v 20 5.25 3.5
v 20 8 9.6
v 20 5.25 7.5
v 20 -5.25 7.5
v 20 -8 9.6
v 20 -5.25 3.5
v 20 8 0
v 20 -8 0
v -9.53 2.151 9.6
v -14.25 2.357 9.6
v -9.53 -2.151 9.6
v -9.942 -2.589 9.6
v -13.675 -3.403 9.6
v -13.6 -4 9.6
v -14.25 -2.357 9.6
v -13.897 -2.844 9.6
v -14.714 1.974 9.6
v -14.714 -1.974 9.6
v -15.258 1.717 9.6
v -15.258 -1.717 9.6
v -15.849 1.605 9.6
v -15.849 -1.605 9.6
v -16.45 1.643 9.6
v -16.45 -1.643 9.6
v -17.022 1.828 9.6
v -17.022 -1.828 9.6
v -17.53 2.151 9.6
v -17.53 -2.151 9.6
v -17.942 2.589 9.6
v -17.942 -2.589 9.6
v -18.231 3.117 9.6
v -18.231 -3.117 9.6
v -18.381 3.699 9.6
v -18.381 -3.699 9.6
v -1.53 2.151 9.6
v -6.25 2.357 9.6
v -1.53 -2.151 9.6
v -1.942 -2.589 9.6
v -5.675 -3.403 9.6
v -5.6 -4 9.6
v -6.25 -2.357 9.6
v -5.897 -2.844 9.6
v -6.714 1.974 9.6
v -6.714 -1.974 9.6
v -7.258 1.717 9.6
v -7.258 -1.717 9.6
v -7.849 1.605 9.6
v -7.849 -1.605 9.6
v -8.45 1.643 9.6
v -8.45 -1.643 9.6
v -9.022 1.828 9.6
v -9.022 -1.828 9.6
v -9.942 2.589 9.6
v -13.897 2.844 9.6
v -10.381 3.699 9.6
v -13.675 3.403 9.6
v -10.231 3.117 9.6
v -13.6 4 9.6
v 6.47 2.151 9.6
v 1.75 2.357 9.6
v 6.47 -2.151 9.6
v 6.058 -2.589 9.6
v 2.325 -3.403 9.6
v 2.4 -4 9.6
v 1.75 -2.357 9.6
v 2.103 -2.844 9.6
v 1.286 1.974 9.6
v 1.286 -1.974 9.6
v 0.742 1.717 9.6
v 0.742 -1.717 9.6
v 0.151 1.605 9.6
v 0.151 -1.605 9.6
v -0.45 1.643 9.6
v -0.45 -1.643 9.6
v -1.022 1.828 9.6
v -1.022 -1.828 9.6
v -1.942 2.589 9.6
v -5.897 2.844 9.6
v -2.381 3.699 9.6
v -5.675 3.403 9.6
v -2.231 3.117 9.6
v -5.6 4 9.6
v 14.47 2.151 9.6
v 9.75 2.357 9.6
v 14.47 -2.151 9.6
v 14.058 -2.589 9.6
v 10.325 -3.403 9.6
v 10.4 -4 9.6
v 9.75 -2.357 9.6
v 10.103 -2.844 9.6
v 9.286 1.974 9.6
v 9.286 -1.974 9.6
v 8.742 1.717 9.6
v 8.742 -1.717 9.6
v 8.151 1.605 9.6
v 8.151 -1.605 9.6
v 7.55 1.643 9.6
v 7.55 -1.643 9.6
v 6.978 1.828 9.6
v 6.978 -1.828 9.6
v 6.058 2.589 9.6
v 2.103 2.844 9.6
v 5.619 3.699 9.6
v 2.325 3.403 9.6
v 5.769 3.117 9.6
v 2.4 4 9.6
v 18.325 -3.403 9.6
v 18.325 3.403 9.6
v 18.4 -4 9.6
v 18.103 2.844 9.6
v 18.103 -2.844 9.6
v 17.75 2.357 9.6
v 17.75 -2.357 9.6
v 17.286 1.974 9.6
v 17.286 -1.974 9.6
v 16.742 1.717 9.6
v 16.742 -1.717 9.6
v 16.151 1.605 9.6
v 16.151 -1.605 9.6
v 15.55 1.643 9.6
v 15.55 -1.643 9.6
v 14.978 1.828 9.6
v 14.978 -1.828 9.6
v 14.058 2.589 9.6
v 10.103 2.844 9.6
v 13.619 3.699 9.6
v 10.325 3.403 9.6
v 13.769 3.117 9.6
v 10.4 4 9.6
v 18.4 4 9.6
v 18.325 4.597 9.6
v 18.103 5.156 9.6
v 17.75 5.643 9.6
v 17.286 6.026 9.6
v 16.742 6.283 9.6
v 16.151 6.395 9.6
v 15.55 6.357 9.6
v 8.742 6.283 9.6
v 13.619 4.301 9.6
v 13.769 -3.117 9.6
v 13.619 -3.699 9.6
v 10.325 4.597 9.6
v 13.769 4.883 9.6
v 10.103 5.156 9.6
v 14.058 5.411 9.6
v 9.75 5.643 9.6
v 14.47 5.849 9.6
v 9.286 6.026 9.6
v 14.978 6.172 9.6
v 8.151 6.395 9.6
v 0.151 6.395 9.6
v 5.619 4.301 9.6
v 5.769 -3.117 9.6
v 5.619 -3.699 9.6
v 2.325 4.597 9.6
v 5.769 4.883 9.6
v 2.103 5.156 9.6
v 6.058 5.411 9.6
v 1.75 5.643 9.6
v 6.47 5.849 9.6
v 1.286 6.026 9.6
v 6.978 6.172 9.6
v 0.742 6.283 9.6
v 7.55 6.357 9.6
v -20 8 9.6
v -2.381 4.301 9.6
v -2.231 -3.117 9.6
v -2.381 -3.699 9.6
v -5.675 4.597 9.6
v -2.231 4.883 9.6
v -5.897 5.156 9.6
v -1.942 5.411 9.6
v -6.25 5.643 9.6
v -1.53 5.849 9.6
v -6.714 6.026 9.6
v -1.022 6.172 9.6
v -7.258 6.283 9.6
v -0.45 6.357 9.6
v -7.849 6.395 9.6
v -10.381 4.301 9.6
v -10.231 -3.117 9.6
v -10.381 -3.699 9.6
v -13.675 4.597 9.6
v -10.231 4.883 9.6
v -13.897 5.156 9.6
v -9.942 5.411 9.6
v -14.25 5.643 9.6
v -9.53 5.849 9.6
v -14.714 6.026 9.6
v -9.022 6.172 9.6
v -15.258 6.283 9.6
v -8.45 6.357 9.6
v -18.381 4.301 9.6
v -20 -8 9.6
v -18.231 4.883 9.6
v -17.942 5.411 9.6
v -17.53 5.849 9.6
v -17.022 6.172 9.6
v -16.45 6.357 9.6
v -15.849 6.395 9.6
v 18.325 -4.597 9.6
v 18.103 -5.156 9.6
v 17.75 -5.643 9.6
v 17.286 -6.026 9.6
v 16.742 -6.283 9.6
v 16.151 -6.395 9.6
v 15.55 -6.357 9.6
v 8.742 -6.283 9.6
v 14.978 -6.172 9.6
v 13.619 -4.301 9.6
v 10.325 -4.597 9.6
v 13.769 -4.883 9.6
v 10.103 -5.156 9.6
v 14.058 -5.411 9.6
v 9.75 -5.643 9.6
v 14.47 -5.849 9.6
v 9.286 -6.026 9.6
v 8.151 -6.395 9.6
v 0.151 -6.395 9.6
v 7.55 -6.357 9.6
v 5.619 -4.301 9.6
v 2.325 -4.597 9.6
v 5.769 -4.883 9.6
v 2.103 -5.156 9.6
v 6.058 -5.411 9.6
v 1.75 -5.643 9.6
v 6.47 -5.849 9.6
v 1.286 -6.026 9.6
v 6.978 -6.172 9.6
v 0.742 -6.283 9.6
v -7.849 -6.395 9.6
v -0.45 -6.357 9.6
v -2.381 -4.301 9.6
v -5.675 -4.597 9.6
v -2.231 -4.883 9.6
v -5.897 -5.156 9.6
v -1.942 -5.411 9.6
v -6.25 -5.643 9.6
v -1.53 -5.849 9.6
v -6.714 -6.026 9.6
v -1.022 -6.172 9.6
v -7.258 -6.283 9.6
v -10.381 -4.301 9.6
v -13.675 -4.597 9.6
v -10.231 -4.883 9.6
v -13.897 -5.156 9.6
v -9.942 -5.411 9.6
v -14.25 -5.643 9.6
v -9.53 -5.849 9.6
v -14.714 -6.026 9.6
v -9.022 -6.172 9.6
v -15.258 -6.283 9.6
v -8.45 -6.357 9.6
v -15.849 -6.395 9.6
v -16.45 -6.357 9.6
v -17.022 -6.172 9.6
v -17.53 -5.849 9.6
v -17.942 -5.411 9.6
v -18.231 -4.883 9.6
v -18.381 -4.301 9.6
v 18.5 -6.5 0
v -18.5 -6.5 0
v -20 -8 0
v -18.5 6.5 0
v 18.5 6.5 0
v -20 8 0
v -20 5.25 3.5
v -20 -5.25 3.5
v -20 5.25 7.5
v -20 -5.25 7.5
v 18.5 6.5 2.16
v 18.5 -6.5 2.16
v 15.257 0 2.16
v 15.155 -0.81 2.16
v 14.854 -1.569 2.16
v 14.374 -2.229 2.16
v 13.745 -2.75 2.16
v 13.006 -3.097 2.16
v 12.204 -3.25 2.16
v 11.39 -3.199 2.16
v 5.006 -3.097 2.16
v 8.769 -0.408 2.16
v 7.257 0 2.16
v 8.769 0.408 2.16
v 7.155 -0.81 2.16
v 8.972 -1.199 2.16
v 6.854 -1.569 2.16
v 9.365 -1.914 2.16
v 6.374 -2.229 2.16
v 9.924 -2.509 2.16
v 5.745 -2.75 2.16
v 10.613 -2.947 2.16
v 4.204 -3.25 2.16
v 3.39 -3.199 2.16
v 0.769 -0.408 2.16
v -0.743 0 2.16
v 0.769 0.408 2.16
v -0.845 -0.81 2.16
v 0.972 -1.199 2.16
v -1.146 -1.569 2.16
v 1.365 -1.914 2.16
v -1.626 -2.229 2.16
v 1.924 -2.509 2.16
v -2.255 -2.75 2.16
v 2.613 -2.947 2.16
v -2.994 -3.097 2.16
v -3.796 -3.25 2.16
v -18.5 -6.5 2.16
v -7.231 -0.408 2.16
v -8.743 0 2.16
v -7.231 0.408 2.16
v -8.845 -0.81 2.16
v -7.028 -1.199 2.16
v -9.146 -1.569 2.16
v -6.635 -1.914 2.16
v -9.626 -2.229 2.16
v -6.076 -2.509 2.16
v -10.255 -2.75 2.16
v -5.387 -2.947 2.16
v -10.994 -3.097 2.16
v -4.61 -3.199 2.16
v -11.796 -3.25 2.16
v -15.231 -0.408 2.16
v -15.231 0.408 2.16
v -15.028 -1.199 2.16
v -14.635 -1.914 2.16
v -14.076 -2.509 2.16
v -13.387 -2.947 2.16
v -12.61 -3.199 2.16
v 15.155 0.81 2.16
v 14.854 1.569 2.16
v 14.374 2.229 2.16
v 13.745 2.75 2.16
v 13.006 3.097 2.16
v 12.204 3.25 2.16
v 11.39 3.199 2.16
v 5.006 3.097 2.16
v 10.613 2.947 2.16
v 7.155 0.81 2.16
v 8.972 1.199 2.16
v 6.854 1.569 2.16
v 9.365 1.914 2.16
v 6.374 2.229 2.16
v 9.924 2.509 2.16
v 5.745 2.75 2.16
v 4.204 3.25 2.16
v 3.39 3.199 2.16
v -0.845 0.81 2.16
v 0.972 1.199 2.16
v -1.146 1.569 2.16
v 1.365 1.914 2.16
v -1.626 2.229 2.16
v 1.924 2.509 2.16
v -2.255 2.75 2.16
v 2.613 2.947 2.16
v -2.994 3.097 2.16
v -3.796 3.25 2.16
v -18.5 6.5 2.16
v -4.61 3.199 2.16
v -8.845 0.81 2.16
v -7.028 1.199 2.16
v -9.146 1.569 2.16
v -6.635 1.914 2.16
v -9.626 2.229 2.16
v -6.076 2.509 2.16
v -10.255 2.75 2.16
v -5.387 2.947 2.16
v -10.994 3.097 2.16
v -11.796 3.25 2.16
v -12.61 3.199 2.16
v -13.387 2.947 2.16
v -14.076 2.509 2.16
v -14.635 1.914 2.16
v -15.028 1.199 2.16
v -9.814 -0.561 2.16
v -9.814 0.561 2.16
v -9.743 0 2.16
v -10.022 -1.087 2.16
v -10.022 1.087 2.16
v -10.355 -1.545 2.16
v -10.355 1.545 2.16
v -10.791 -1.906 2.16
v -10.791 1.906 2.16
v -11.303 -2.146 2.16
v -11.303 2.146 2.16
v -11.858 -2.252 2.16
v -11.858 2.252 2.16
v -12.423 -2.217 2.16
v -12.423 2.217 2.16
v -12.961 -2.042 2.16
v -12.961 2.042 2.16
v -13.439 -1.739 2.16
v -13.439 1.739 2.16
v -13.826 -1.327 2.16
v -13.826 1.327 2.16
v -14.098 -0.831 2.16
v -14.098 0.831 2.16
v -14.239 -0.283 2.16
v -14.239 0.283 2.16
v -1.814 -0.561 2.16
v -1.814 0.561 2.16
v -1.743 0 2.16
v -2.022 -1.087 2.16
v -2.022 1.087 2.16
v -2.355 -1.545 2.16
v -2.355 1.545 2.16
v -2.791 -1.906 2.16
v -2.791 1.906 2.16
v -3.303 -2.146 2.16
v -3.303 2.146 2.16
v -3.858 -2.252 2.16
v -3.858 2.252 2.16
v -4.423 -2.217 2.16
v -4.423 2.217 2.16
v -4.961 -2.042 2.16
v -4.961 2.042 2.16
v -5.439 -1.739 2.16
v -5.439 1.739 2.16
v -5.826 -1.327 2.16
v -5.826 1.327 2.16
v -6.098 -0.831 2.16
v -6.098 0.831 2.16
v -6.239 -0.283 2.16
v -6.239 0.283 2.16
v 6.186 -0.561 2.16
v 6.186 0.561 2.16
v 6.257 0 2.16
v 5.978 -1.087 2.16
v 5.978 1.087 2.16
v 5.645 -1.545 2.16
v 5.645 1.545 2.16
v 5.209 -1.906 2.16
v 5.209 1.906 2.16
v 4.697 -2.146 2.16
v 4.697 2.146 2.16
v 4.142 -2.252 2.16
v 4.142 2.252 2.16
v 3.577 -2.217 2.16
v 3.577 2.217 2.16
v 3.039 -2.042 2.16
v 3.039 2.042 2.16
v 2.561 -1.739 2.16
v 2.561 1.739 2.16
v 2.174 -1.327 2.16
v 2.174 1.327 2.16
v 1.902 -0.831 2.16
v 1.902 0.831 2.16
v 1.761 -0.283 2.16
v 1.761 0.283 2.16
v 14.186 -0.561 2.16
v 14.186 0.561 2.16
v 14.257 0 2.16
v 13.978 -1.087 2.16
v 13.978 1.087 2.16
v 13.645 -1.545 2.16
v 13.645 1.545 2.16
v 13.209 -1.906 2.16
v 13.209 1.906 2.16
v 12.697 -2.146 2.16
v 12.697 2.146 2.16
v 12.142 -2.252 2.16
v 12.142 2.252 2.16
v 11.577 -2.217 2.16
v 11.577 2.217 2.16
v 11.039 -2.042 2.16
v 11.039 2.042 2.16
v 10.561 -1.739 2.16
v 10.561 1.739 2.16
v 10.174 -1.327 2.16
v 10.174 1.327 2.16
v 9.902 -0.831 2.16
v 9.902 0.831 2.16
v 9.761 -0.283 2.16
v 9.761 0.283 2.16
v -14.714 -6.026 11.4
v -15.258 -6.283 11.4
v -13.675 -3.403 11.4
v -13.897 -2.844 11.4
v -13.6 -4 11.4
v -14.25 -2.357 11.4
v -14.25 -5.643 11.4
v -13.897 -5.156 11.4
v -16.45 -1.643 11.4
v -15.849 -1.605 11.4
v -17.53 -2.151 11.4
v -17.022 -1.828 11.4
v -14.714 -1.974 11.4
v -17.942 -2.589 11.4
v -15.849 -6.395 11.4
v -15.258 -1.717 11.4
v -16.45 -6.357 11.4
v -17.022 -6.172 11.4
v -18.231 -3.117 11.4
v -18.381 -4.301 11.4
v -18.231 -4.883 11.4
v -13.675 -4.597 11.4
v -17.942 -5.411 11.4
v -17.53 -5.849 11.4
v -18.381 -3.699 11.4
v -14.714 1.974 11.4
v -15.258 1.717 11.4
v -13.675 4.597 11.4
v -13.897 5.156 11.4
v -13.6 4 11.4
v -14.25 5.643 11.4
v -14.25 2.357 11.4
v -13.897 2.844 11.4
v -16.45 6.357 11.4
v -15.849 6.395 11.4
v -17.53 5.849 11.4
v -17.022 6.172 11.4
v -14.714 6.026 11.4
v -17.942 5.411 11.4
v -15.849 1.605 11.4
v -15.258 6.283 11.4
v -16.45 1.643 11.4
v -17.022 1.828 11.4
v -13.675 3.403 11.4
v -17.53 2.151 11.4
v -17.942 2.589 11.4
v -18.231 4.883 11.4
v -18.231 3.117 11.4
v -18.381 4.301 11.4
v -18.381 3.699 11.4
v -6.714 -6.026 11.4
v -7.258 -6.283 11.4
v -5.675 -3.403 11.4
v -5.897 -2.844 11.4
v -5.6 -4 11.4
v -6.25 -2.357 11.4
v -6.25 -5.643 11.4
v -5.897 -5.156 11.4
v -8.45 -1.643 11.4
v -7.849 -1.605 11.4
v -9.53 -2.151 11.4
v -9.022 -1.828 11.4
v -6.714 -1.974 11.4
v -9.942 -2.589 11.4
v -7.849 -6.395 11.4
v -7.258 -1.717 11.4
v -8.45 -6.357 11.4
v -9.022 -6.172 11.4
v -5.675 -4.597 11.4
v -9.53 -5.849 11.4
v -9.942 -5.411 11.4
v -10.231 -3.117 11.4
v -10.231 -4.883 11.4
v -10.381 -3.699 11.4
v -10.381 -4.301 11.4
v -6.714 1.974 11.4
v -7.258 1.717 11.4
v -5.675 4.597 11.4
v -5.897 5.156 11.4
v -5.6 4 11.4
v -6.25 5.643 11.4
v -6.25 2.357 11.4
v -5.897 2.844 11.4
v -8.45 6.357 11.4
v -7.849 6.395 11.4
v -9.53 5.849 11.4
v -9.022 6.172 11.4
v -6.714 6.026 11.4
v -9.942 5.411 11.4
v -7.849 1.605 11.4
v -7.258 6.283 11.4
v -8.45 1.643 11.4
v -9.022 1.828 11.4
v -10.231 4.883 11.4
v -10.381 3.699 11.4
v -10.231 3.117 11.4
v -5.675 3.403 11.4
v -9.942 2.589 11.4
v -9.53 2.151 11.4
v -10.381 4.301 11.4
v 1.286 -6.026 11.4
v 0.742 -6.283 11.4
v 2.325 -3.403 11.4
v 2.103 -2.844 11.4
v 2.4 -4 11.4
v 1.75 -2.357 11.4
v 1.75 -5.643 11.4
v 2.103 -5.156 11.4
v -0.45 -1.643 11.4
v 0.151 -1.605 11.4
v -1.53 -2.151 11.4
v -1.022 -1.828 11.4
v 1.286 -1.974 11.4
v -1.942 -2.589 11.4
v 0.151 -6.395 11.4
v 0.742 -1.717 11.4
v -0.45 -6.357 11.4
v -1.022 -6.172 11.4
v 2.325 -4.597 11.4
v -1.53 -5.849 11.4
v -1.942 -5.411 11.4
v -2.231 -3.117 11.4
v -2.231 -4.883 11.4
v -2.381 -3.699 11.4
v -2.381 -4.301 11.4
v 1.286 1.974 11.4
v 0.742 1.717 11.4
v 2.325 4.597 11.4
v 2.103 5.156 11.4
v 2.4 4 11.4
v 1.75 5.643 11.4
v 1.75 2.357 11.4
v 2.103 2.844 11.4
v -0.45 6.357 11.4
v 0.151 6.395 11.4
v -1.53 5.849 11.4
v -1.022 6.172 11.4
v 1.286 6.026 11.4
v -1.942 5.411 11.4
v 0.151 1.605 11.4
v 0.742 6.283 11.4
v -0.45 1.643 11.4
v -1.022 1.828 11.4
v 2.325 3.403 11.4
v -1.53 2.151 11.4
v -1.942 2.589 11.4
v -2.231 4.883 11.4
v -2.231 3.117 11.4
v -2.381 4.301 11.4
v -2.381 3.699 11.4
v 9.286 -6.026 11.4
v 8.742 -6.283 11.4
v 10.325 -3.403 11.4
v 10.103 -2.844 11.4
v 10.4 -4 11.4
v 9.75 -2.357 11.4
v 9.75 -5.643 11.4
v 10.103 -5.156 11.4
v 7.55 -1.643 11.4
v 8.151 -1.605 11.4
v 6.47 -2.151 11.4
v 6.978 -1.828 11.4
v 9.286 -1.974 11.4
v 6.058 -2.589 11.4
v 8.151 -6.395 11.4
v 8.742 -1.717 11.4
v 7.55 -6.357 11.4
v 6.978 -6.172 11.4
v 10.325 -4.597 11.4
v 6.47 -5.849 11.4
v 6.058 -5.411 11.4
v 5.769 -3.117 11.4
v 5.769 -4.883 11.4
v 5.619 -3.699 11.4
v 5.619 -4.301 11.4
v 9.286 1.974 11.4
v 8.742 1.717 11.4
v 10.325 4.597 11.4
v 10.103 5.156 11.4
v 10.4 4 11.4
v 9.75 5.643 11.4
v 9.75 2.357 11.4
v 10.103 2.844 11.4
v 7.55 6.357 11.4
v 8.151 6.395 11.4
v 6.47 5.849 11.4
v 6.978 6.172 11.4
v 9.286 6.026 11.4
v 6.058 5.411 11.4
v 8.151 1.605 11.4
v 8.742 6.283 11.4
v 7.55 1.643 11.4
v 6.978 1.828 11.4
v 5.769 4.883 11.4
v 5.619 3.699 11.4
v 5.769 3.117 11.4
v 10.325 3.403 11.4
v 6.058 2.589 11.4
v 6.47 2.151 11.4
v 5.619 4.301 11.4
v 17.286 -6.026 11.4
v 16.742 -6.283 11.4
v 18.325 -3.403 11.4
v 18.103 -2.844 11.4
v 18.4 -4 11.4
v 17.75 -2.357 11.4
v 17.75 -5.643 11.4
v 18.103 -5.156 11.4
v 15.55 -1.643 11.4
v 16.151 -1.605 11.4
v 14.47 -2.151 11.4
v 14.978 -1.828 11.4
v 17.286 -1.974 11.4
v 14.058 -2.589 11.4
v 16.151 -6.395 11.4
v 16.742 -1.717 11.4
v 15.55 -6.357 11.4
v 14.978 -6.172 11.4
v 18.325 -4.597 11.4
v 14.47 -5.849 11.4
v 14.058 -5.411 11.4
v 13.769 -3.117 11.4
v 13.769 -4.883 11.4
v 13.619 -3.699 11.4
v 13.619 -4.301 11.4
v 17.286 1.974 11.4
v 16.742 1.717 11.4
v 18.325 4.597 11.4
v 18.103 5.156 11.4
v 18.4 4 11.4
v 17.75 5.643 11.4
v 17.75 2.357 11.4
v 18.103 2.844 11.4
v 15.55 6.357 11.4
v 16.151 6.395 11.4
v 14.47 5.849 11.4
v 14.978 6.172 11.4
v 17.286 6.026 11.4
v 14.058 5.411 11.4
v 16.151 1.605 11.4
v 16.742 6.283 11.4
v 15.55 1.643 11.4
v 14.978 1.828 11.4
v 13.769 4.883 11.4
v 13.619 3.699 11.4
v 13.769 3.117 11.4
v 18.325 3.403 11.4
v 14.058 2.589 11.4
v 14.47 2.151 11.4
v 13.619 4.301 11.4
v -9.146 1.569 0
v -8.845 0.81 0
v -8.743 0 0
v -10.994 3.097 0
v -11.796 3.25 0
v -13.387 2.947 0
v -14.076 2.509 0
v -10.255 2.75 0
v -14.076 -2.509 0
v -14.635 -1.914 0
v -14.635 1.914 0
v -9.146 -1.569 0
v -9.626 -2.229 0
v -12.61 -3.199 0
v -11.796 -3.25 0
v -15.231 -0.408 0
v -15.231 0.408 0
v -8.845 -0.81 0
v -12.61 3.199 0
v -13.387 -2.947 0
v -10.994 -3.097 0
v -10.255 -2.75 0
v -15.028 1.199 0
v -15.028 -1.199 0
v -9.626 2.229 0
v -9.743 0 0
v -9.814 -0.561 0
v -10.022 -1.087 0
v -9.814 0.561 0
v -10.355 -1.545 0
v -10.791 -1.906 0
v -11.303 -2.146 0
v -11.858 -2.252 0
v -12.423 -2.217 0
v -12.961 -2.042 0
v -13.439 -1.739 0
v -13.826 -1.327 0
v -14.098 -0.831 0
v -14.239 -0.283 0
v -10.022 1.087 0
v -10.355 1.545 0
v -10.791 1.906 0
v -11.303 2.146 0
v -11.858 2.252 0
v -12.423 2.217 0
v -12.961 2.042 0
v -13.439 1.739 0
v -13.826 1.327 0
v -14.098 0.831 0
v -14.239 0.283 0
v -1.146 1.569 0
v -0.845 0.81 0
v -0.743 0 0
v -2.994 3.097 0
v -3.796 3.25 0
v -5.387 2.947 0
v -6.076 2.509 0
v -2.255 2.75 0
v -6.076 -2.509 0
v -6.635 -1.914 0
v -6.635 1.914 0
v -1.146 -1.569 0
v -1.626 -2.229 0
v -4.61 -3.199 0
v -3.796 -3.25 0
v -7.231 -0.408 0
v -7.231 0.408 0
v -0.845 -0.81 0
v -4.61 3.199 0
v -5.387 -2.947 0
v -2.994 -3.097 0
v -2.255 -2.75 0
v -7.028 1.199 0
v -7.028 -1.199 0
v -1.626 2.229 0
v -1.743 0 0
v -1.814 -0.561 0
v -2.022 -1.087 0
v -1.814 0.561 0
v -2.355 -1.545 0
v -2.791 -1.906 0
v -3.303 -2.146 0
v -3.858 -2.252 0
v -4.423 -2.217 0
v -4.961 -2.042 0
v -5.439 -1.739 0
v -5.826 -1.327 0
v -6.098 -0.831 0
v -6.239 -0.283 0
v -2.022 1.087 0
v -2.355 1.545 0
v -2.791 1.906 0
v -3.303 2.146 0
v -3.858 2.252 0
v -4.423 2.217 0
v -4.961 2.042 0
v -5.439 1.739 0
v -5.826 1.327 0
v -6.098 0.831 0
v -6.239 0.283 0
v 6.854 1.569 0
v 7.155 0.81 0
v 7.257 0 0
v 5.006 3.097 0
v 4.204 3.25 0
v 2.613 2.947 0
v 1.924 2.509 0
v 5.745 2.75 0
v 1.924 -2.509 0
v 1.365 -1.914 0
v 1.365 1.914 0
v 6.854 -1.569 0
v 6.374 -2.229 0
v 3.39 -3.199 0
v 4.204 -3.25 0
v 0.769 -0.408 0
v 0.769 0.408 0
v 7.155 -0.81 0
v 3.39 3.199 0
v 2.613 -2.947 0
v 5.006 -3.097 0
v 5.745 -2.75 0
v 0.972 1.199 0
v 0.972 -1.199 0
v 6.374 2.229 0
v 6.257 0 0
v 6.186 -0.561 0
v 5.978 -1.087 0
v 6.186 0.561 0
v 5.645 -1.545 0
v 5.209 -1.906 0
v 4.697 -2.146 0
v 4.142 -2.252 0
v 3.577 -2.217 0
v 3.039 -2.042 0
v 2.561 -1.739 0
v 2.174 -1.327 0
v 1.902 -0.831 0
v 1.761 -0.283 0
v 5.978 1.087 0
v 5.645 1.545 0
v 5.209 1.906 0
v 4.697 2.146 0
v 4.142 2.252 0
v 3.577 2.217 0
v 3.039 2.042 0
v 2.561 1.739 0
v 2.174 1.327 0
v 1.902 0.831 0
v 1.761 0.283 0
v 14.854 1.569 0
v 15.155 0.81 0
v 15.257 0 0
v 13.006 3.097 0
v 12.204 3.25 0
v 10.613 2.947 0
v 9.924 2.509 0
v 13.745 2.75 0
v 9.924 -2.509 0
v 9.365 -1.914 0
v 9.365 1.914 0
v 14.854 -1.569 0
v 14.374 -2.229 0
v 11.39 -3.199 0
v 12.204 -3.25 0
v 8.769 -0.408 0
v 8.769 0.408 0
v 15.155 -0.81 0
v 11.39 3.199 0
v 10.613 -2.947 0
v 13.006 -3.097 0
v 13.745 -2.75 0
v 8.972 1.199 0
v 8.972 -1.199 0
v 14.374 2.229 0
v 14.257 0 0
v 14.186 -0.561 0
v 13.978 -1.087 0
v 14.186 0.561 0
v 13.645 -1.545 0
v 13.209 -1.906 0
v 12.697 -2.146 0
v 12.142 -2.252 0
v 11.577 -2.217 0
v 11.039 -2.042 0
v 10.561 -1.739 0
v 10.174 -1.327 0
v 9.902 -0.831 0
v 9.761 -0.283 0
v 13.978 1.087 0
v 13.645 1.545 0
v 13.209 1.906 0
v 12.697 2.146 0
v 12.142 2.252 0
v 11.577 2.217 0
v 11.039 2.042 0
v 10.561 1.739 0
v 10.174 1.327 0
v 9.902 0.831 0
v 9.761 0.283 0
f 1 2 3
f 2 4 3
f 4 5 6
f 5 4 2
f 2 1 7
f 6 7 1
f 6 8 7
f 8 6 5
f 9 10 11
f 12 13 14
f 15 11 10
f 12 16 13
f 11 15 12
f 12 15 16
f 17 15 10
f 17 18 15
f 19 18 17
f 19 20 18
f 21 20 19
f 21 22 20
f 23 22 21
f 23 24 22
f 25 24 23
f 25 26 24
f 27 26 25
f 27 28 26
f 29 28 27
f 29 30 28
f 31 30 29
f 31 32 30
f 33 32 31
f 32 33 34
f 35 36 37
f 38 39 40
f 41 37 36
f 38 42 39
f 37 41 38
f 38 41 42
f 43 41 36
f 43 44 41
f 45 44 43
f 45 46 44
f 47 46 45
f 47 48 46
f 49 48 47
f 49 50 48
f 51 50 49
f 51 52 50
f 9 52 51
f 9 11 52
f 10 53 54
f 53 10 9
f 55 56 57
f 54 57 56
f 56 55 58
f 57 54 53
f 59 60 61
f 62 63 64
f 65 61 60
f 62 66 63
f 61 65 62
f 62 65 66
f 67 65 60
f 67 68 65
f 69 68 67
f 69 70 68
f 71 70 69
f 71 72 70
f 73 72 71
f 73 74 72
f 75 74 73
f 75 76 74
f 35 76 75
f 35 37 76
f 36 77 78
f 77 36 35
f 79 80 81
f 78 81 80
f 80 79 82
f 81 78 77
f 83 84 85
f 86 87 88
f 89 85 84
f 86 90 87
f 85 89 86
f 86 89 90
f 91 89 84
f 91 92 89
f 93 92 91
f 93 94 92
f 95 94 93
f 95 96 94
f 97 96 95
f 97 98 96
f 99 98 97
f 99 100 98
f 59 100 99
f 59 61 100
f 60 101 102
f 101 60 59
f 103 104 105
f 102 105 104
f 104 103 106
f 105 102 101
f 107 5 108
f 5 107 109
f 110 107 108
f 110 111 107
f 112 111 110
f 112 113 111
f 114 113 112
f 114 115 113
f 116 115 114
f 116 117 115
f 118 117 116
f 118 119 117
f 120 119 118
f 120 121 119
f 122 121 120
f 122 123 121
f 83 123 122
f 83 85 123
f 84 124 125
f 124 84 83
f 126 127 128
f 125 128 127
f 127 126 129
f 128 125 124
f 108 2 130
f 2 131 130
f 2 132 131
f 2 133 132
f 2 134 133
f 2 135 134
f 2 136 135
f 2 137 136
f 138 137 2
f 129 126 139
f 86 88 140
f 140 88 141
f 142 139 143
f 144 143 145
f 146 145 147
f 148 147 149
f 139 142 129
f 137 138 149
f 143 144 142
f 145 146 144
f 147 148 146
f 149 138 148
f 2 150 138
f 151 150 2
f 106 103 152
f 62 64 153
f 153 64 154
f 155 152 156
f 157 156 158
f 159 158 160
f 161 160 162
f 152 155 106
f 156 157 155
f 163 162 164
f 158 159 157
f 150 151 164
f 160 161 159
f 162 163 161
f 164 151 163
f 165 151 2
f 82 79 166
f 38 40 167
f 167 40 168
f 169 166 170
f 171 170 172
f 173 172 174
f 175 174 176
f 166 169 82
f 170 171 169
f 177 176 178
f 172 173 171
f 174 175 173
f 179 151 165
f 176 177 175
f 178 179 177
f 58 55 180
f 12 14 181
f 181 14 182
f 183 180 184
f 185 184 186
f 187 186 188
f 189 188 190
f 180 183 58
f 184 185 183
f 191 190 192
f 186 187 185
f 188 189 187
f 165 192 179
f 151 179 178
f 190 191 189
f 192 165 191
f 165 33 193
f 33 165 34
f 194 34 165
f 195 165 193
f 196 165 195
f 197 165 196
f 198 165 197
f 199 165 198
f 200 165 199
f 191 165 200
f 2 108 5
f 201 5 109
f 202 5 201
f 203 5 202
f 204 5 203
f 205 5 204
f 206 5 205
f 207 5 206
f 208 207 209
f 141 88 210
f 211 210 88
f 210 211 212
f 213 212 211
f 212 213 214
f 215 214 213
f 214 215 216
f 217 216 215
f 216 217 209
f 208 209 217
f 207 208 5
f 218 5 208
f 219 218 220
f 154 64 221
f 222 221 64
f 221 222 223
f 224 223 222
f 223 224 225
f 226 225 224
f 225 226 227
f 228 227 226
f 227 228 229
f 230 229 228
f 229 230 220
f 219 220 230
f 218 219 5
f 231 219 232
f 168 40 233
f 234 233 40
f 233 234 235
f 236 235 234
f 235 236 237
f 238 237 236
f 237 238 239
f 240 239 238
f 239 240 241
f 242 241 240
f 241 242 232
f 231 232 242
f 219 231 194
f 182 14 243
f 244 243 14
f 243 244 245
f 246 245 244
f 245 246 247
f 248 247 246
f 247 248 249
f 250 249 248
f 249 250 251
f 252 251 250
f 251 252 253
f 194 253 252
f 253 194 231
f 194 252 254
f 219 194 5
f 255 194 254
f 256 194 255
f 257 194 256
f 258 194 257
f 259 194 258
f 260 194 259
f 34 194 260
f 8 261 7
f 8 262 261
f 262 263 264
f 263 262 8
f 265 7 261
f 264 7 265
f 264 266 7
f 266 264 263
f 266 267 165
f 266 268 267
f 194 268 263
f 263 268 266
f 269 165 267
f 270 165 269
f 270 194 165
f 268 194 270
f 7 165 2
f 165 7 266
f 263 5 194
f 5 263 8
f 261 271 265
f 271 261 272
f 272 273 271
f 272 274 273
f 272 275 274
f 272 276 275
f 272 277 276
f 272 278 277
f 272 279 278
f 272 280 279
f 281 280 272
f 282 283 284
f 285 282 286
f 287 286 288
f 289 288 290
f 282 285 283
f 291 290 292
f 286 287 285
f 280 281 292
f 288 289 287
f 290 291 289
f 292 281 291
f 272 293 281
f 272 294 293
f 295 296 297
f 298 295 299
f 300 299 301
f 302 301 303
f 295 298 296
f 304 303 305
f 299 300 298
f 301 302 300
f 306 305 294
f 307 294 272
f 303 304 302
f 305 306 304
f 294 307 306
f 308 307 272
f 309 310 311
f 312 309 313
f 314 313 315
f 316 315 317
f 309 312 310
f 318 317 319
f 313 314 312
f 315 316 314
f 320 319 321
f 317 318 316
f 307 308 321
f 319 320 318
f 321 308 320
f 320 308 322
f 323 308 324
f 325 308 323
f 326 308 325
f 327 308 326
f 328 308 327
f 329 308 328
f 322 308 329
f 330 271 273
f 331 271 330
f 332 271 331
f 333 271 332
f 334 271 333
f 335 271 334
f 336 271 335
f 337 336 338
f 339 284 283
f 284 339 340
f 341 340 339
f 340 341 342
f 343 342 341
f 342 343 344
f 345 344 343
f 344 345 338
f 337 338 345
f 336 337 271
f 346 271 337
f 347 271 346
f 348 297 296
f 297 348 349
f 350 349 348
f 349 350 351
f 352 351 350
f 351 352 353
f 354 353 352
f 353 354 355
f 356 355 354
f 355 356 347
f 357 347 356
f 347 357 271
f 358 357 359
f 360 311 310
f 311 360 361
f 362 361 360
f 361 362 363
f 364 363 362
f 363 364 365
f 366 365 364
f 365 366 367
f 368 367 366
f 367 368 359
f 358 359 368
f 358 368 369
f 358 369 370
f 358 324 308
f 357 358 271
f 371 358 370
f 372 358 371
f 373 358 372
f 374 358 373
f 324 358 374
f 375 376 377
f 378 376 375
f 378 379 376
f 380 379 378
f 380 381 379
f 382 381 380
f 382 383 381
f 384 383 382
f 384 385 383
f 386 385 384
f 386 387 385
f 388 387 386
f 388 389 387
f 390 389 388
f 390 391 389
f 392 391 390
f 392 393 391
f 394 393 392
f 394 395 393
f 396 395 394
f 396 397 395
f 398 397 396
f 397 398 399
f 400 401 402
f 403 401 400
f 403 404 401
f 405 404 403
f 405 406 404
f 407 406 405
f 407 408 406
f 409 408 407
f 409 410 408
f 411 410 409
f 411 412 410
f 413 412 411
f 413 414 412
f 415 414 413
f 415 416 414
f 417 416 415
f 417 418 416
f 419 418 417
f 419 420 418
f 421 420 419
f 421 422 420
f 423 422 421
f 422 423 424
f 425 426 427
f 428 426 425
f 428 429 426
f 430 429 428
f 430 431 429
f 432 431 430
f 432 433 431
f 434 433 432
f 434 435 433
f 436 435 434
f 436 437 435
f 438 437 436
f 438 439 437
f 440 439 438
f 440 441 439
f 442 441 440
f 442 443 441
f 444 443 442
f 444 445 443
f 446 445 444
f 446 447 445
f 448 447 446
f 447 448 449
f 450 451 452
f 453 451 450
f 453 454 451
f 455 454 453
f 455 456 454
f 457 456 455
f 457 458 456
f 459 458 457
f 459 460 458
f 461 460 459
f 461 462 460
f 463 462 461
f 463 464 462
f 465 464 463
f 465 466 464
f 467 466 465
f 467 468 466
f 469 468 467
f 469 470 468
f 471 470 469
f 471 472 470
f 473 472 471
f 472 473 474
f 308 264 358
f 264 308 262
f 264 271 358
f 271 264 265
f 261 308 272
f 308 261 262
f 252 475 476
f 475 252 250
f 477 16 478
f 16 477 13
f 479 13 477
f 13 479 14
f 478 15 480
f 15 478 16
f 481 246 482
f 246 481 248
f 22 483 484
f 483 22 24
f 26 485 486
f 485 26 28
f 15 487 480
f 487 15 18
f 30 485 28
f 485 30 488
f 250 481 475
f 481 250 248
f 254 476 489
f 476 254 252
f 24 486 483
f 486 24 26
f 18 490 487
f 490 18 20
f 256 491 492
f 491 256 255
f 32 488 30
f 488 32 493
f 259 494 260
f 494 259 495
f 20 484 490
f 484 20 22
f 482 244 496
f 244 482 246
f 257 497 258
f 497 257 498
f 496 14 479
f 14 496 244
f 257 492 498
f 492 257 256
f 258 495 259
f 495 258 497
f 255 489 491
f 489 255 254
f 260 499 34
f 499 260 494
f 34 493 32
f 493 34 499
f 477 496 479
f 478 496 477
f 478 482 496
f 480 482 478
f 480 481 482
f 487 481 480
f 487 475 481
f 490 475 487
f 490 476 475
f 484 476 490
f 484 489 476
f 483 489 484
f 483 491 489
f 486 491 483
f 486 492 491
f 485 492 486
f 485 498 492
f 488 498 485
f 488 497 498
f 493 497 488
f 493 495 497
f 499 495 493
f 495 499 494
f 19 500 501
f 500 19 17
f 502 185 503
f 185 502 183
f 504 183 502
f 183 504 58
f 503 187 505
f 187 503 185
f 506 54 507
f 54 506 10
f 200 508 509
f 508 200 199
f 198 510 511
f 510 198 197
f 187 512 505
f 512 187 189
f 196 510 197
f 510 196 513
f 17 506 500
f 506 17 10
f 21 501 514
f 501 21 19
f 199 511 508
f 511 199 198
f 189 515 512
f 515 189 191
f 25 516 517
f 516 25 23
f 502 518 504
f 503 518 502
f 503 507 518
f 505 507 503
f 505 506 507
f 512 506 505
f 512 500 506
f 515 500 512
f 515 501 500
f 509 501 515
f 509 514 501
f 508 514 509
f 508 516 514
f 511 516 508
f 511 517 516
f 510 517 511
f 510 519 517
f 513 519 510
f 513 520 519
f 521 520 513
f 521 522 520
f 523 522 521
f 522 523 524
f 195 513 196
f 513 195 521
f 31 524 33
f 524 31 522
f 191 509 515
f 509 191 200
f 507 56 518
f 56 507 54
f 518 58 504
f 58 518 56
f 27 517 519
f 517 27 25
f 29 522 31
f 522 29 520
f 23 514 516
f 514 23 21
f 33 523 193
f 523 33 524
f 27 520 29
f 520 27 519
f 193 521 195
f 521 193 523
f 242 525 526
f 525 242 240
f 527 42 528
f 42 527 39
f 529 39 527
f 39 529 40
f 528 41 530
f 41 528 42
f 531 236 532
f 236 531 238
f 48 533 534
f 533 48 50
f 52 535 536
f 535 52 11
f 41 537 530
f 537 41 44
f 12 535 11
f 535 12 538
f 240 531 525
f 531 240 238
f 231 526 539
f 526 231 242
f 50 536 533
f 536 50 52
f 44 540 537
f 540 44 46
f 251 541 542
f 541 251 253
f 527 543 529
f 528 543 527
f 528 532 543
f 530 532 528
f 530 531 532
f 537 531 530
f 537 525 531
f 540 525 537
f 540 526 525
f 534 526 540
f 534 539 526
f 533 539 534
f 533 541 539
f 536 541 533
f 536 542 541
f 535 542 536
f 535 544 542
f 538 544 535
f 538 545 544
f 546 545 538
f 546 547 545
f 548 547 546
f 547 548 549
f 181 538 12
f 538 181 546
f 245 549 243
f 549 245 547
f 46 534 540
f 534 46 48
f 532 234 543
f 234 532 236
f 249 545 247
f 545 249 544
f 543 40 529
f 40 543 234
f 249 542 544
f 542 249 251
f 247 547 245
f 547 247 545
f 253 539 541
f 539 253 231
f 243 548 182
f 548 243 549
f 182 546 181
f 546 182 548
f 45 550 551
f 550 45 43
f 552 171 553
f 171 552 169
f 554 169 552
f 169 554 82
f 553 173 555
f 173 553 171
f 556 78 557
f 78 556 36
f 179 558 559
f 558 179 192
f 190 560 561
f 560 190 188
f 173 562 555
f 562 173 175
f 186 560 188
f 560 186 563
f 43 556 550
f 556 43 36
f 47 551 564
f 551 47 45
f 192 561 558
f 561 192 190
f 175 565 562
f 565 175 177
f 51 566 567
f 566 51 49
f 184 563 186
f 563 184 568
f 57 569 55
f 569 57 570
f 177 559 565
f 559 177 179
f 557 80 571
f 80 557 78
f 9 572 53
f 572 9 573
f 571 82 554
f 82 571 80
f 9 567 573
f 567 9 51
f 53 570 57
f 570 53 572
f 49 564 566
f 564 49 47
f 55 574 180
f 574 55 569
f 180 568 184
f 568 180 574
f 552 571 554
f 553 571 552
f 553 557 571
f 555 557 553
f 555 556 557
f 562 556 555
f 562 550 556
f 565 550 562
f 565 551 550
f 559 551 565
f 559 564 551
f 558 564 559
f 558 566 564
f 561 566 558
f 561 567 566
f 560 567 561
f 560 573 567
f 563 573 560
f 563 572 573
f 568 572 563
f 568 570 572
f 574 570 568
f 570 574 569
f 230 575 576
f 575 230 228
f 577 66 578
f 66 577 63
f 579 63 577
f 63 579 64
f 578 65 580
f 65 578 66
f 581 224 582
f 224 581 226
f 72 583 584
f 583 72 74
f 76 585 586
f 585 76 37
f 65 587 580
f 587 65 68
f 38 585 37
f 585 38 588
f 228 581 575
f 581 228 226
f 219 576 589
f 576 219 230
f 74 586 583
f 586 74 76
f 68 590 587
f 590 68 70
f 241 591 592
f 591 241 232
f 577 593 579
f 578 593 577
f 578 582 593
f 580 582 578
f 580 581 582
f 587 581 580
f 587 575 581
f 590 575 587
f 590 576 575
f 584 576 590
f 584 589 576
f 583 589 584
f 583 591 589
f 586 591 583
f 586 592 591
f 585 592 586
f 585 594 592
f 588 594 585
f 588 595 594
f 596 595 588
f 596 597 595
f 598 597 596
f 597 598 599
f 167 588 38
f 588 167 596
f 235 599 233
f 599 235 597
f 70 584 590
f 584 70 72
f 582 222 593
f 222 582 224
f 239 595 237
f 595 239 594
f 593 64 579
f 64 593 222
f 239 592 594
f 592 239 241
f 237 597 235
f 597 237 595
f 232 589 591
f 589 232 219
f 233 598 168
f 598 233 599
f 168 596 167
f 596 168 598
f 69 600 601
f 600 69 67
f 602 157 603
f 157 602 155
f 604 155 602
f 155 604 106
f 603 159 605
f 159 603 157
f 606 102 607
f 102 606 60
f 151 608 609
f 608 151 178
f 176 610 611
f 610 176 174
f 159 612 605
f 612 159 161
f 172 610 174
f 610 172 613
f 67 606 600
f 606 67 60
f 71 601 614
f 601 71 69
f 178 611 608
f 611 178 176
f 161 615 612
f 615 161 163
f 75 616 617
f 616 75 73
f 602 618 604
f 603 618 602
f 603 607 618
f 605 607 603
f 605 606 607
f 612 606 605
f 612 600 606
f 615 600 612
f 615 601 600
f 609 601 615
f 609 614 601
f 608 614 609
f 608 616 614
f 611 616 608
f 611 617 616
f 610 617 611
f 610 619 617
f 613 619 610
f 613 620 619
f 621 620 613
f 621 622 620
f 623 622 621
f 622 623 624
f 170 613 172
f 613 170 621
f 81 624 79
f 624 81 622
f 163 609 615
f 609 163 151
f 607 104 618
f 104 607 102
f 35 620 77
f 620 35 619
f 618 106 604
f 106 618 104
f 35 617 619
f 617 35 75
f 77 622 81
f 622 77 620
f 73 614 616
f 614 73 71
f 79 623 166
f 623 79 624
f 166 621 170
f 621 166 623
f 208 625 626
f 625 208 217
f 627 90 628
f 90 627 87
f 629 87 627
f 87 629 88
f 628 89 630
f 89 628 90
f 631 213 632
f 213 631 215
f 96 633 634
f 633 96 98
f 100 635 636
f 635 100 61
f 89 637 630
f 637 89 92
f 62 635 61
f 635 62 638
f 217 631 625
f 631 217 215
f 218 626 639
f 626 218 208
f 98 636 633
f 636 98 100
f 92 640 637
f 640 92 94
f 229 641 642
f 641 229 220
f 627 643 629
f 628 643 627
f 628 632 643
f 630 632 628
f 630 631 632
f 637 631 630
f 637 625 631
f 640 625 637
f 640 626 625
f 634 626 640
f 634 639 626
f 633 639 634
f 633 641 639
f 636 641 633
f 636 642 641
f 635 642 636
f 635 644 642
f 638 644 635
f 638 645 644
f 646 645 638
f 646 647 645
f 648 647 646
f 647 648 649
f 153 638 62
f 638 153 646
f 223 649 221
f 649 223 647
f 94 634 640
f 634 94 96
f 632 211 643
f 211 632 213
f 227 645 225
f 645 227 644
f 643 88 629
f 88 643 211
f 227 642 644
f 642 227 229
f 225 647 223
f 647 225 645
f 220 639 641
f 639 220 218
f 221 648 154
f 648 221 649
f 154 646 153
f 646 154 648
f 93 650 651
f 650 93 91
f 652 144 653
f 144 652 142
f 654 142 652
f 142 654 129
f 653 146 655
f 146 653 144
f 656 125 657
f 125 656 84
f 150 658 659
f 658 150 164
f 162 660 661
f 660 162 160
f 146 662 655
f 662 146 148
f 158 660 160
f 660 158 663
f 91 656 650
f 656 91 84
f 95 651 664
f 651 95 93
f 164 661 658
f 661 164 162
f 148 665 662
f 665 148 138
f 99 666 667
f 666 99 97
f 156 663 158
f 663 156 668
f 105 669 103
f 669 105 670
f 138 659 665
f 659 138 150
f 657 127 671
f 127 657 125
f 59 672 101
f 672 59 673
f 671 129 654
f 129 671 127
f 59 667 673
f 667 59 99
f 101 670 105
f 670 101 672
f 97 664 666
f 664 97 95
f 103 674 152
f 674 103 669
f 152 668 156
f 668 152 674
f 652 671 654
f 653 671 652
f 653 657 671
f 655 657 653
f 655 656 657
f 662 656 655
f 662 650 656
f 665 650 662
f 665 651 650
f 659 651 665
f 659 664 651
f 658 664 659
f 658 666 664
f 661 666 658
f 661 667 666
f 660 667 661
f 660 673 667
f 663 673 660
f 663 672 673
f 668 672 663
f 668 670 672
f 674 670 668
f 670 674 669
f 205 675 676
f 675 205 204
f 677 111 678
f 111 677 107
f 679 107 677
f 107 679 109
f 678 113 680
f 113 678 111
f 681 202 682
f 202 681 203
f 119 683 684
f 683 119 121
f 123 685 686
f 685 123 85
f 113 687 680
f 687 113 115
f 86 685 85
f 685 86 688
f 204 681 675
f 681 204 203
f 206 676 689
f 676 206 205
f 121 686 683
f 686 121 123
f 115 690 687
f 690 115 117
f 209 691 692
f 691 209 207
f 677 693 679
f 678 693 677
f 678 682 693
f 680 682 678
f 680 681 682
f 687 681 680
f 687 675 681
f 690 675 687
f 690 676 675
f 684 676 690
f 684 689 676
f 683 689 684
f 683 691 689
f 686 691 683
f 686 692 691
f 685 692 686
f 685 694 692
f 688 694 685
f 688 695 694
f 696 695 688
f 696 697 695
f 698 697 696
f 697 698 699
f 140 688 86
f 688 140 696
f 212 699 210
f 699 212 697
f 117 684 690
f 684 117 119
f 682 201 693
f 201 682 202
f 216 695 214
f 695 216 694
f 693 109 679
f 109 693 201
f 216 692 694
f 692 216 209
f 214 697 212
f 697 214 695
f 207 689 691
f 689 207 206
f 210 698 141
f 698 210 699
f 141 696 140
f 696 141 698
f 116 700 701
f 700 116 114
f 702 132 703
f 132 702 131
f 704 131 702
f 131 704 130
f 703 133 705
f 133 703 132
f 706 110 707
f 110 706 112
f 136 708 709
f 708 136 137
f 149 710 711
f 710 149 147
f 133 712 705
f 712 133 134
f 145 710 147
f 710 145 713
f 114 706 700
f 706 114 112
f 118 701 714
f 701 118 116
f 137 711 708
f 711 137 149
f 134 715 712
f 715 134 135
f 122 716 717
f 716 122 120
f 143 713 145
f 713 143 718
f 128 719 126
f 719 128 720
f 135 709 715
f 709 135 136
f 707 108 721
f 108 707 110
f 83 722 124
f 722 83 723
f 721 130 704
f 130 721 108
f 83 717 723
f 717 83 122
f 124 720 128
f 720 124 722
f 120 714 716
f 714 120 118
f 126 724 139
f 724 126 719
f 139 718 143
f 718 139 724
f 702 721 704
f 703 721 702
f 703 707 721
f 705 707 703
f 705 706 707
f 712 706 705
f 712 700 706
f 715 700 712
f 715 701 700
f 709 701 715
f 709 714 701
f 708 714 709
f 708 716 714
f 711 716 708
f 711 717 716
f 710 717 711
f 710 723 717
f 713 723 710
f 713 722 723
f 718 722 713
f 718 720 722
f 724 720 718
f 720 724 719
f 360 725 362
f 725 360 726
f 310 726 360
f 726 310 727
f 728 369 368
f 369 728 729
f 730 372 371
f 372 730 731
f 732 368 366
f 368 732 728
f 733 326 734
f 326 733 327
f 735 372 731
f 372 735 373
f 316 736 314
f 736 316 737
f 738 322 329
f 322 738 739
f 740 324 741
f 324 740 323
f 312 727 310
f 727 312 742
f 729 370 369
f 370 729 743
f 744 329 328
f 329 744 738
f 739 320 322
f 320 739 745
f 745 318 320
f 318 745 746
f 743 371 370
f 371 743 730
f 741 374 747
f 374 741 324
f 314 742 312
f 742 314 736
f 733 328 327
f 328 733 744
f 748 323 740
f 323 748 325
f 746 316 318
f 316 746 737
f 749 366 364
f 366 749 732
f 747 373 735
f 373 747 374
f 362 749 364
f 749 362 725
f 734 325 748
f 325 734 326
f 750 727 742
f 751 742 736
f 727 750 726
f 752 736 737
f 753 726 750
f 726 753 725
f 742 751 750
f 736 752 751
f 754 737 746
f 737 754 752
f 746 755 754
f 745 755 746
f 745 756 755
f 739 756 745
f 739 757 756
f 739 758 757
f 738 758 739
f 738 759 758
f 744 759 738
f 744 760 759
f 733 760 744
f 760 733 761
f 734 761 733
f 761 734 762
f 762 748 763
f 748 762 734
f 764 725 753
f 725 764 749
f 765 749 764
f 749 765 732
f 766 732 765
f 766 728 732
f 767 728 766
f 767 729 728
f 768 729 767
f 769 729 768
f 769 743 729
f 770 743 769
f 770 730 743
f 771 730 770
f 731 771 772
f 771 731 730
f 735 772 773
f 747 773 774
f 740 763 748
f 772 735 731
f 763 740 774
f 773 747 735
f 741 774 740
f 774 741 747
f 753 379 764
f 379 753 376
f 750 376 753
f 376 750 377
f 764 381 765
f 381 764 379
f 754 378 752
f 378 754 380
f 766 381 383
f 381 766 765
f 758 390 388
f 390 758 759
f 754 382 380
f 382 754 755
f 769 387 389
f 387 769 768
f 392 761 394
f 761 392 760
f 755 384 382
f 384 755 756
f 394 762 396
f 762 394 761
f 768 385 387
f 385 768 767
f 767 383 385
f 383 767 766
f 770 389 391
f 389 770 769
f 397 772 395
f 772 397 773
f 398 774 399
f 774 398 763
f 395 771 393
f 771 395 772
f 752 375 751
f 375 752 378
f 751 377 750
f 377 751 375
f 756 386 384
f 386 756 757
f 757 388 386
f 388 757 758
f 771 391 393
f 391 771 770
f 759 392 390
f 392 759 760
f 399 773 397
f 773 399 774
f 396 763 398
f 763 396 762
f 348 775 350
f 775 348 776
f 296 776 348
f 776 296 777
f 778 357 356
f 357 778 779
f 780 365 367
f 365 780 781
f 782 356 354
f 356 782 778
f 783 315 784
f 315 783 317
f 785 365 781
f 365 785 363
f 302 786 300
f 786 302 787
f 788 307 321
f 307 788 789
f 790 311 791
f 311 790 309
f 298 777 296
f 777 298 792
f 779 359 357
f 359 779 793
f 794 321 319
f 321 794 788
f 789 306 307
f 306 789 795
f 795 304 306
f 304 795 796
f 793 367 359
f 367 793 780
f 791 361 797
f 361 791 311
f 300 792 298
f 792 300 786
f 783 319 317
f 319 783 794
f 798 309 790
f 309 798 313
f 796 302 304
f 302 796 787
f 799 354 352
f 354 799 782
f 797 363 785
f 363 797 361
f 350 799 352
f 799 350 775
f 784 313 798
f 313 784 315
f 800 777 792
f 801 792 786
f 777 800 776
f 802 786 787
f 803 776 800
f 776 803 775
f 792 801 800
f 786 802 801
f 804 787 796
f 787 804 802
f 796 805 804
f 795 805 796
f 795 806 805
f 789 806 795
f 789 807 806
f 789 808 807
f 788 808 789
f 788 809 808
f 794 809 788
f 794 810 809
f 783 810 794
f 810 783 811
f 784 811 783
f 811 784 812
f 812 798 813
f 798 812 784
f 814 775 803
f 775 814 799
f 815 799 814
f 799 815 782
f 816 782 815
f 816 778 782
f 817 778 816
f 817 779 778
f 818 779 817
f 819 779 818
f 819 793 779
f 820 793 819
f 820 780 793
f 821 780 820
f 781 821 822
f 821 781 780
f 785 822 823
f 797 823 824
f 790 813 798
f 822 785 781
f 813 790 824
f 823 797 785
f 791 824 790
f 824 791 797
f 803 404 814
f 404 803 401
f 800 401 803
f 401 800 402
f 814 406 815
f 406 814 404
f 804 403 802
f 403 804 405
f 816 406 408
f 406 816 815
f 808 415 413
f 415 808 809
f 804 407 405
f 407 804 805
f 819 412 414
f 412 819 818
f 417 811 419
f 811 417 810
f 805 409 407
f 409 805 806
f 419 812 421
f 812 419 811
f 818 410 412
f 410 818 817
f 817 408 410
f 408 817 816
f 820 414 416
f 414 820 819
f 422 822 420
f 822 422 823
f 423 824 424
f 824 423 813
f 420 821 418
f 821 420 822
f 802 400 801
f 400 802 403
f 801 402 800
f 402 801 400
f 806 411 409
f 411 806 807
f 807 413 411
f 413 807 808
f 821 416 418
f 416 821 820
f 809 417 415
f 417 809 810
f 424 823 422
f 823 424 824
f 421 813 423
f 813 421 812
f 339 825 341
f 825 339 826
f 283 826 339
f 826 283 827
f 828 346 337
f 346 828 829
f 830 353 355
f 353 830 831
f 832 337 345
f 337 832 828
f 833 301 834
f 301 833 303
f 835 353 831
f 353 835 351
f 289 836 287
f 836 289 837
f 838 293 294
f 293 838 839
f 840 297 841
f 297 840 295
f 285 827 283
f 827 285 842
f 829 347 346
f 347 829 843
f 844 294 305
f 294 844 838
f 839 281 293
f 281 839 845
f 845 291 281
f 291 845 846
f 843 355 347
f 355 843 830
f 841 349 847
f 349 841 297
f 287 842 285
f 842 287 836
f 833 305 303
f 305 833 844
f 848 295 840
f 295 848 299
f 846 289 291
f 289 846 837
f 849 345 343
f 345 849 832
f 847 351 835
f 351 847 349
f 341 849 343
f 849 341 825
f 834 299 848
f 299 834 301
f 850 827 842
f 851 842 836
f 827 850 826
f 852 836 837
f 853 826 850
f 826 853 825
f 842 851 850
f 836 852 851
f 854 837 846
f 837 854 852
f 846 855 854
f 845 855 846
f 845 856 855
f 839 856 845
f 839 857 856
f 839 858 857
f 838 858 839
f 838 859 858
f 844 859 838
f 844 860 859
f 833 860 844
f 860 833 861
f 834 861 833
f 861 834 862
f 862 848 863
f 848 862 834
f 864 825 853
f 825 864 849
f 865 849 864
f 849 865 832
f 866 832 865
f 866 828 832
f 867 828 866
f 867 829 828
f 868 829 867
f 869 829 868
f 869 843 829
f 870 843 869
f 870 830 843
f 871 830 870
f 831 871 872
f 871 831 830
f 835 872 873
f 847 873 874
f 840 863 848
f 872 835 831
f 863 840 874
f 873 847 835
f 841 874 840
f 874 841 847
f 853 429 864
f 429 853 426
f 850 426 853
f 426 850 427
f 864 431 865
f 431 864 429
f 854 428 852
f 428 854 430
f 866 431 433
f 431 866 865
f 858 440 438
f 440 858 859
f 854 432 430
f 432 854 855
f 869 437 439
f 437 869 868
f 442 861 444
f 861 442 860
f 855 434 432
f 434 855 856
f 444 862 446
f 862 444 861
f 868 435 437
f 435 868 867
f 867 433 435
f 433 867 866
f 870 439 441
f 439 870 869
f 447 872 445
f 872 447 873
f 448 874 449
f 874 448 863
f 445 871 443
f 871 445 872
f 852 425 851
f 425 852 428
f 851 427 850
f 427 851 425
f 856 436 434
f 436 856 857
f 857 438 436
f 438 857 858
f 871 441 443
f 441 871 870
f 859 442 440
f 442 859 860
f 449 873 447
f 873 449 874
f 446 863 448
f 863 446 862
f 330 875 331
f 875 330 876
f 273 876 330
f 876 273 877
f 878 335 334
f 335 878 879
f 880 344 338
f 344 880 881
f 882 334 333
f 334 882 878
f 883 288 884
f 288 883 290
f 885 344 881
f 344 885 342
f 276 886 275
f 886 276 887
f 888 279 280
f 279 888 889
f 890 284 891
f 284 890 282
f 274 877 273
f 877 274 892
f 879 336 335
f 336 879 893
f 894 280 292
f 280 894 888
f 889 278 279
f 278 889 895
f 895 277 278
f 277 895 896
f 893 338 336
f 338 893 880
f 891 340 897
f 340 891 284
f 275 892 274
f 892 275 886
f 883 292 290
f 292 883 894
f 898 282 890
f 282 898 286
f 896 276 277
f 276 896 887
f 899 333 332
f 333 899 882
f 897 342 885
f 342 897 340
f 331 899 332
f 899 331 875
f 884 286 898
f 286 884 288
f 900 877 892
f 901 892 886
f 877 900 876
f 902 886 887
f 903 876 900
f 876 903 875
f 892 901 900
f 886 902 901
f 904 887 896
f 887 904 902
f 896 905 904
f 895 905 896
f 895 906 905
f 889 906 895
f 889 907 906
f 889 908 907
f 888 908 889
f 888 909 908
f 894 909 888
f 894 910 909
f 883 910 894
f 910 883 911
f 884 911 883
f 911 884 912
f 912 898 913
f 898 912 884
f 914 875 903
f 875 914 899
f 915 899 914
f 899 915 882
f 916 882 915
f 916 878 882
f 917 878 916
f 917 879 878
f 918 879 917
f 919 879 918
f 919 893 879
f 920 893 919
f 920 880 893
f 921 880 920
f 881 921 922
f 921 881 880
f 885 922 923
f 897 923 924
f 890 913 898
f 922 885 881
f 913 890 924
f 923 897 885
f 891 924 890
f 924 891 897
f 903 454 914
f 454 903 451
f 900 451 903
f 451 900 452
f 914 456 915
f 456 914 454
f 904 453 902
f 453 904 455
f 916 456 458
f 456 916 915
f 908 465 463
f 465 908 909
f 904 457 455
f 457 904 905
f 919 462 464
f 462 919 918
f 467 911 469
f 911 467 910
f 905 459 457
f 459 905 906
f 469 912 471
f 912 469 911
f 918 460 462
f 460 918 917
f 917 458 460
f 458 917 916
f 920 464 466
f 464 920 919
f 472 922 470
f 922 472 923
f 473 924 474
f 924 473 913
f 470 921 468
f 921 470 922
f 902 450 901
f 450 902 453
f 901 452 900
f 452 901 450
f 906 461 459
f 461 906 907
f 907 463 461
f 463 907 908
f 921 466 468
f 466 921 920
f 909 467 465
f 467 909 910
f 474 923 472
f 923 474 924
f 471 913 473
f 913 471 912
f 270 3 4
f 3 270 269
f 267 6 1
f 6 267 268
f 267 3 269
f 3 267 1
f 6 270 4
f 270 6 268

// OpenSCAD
// file: Lego Modular.scad
rounded_p = false;

brick_h = 9.6;
unit = 8;
bump_h = 1.8;
bump_r = 2.4;
wall = 1.5;
cyl_wall = 1;
top_depth = 1.5;
cyl_r = (unit * sqrt(2) - 2 * bump_r) / 2;

gap = 0;  // this is wrong -- makes the base gaps smaller, not larger
gaps = 2 * gap;

module brick(bumps_x, bumps_y, height = 1, shallow_p = 0) {
    l = unit * bumps_x - gaps;
    w = unit * bumps_y - gaps;
    h = height * brick_h;
    
    h_offset = ( shallow_p == 0 ) ? -top_depth : (1.2 * bump_h + gaps - h);

    difference() {
        // outside box
        translate([-l / 2, -w / 2 ,0]) {
            cube([l, w, h]);
        }
        
        // inside cut
        translate([
            -(l - gaps - 2 * wall) / 2,
            -(w - gaps - 2 * wall) / 2,
            h_offset
        ]) {
            cube([
                l - gaps - 2 * wall,
                w - gaps - 2 * wall,
                h
            ]);
        }
    }
}

module bumps(bumps_x, bumps_y) {
    translate([(-1 - bumps_x) * unit / 2, (-1 - bumps_y) * unit / 2, 0])
        for (x = [1 : bumps_x], y = [1 : bumps_y]) {
            translate([x * unit, y * unit, 0]) {
                intersection() {
                    cylinder(r = bump_r, h = bump_h + top_depth / 2);
                    if ( rounded_p ) {
                        sphere(bump_h + top_depth);
                    }
                }
            }
        }
}

module base(bumps_x, bumps_y, height = 1, shallow_p = 0) {
    h = shallow_p ? (1.5*bump_h + gaps + cyl_wall) : ((height * brick_h) - top_depth);

   	if (bumps_x > 1 && bumps_y > 1) {
		translate([
			(-bumps_x) * unit / 2,
			(-bumps_y) * unit / 2,
			0
		]) {
			for (x = [1 : bumps_x - 1], y = [1 : bumps_y - 1]) {
				translate([x * unit, y * unit, 0]) {
					difference() {
						cylinder(r = cyl_r, h = h + 0.02);
						translate([0, 0, -1 - cyl_wall]) {
							cylinder(r = cyl_r - cyl_wall, h = h + 1);
						}
					}
				}
			}
		}
	}
}

module lego(bumps_x, bumps_y, height = 1, shallow_p = 0) {
    brick(bumps_x, bumps_y, height, shallow_p);

    translate([0, 0, (brick_h * height) - top_depth / 2	])
        bumps(bumps_x, bumps_y);

    base(bumps_x, bumps_y, height, shallow_p);
}

//lego(6, 2, shallow_p = 0, height = 2);
// main file
include <Lego Modular.scad>

$fn = 25;

difference() {
    lego(5,2,1,true);
    
    translate([0, 0, 5.5]) cube([100, 10.5, 4], center = true);
}
